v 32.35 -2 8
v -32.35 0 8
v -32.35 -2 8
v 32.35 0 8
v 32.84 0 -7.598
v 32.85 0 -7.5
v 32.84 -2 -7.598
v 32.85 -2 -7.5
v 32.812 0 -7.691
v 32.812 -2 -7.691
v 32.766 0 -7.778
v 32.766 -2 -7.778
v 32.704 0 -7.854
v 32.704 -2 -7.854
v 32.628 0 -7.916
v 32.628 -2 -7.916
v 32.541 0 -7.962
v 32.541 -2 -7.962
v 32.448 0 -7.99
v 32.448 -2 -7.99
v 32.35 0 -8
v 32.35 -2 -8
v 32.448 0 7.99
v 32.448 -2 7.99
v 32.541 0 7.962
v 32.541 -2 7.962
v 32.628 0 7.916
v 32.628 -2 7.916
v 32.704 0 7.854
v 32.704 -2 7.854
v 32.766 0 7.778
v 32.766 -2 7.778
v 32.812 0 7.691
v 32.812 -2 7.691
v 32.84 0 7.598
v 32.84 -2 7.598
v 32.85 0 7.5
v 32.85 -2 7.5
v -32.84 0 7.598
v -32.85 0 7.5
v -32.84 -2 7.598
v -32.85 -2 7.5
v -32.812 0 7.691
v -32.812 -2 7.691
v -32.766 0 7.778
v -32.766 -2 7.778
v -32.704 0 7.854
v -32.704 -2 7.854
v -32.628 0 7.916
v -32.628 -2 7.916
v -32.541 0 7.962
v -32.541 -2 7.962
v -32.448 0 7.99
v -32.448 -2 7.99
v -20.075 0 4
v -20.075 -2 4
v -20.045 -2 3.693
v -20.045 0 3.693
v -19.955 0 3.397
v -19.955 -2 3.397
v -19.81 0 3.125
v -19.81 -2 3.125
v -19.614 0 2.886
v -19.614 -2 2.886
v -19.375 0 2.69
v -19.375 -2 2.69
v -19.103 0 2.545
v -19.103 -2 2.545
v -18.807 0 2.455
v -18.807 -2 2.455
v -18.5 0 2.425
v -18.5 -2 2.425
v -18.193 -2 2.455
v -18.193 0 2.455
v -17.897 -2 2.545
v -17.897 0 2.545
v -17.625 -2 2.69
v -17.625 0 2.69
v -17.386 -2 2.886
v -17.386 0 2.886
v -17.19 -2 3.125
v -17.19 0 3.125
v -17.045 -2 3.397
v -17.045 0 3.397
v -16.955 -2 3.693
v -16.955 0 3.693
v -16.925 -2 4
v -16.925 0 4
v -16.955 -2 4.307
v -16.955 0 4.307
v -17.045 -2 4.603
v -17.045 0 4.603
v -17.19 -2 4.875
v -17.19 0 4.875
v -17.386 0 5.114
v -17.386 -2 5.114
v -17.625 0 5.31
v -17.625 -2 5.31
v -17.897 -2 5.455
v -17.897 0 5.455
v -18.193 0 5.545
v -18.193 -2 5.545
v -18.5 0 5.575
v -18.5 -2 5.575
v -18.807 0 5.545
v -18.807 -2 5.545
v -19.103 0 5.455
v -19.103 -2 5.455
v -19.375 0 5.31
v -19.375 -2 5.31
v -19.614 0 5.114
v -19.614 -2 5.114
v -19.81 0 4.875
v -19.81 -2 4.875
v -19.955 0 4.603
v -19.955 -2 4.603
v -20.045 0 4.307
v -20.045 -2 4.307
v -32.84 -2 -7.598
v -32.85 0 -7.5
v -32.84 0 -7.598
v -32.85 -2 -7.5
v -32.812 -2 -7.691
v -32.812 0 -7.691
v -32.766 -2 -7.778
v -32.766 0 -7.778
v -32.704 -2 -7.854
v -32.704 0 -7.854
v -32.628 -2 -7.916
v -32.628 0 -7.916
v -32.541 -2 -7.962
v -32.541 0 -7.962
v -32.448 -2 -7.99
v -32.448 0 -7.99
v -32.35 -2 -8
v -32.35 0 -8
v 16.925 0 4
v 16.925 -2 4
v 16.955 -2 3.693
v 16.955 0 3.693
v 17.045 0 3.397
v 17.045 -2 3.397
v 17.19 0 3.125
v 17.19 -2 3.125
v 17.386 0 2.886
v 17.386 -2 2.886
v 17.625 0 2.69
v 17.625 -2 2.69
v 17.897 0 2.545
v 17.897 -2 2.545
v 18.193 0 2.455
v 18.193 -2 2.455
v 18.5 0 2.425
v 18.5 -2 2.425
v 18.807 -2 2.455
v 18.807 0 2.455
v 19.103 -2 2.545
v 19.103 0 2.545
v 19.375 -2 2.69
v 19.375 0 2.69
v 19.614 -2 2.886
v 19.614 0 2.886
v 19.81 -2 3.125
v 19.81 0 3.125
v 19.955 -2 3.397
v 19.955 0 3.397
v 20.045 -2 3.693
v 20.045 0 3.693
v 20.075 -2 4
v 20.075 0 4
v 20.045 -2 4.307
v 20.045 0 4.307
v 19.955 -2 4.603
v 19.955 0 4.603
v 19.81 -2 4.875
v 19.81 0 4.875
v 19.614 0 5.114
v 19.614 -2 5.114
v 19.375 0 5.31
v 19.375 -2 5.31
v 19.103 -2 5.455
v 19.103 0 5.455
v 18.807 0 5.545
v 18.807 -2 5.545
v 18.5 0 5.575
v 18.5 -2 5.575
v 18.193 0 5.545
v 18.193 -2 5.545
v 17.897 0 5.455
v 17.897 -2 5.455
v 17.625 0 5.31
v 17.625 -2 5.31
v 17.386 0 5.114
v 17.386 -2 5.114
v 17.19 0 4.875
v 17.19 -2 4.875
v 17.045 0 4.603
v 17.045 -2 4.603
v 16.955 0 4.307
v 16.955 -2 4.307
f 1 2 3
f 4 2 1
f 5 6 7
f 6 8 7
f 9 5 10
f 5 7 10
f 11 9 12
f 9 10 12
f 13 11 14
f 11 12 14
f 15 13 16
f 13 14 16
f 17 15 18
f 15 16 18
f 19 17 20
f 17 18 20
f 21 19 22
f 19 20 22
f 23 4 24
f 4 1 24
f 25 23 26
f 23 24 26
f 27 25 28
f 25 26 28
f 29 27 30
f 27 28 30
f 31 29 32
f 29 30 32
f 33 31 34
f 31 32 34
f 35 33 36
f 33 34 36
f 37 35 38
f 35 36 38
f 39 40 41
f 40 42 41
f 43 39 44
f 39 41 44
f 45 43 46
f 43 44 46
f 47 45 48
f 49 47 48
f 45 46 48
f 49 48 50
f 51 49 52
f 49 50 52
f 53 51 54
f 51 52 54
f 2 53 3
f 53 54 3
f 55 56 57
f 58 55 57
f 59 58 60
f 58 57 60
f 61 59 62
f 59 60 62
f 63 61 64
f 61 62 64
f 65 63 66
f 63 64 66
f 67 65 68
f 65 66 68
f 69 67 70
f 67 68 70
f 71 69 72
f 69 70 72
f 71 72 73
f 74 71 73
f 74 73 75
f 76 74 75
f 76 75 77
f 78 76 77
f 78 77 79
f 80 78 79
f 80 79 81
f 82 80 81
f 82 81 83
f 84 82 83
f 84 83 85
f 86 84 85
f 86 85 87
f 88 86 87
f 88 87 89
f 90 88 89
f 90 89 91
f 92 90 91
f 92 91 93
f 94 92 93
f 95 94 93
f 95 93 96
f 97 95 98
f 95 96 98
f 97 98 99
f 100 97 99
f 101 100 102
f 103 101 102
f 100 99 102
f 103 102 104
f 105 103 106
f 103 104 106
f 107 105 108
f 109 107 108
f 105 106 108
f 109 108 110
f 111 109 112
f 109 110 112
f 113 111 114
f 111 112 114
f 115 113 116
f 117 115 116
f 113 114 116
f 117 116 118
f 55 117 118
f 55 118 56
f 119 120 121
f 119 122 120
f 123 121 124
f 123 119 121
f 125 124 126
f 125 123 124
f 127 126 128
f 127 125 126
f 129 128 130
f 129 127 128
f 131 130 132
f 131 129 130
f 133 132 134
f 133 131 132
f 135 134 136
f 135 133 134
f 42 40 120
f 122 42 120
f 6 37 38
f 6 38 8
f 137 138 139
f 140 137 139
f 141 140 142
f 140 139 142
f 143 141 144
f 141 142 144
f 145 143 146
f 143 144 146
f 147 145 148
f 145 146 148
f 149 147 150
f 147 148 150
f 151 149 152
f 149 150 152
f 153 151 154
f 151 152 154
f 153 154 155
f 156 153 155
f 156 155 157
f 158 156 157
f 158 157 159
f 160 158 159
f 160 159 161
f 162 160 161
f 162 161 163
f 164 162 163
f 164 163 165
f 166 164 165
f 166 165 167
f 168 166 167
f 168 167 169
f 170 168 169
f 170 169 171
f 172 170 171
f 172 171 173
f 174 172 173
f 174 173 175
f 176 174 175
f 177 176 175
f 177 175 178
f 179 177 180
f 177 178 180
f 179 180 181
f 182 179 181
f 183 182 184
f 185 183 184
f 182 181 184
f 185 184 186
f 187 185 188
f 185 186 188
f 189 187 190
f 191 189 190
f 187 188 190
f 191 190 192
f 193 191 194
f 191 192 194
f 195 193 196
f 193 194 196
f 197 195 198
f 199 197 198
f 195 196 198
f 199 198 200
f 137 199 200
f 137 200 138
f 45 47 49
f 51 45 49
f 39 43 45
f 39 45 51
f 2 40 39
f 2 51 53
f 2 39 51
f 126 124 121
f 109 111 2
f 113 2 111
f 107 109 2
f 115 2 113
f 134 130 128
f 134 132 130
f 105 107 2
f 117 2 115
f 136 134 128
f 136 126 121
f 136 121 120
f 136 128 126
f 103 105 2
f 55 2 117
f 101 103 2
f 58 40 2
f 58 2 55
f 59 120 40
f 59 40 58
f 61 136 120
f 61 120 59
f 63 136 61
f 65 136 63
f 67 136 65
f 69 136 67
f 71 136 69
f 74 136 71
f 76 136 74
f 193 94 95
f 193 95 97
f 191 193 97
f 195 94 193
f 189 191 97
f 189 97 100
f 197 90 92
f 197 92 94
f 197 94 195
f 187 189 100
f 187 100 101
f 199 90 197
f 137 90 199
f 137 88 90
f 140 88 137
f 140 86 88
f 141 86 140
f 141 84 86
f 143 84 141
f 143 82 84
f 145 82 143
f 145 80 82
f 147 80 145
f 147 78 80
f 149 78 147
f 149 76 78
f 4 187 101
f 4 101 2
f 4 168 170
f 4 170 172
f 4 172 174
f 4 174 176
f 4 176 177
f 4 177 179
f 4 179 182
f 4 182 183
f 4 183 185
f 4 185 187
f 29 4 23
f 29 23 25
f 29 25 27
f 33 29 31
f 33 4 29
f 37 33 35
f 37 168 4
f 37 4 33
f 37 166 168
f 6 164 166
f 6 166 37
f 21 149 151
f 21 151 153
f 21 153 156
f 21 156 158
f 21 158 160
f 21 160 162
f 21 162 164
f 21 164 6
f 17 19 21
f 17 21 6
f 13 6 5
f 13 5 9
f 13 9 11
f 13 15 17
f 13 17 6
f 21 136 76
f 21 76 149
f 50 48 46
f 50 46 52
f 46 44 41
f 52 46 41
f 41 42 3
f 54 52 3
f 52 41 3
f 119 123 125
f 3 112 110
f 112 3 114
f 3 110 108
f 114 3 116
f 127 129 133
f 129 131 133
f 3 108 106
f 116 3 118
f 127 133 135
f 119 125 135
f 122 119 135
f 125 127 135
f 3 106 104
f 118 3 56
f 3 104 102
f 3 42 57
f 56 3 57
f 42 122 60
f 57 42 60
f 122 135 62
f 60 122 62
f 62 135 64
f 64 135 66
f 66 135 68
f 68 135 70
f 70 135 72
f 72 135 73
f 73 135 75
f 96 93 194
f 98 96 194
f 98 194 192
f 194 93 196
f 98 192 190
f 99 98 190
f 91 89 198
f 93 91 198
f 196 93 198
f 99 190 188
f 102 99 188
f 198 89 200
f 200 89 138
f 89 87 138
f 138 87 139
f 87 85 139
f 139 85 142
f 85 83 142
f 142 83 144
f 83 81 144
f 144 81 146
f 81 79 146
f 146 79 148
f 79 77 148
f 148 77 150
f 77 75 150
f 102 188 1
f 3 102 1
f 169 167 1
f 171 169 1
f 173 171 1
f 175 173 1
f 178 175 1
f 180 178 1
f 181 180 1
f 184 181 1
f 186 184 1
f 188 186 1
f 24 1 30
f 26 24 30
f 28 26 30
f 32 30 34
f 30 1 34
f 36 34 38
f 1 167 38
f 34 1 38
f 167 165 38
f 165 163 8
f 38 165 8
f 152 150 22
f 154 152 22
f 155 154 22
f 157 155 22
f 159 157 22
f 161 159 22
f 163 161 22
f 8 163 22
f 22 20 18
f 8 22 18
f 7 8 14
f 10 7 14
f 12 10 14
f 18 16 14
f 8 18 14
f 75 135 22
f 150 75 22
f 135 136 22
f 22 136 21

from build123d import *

# Parameters (mm, degrees)
SKETCH_1_W        = 65.7
SKETCH_1_H        = 16
EXTRUDE_1_DEPTH   = 2
FILLET_1_R        = 0.5
HOLE_WIZARD_M31_D = 3.15


with BuildPart() as part:
    # Эскиз1 → Бобышка-Вытянуть1 (new body)
    with BuildSketch(Plane(origin=(0, 0, 0), x_dir=(1, 0, 0), z_dir=(0, 1, 0))):
        Rectangle(SKETCH_1_W, SKETCH_1_H)
    extrude(amount=-EXTRUDE_1_DEPTH)

    # Скругление1
    fillet_1_edges = [part.edges().sort_by_distance(p)[0] for p in [
        (32.85, -1, 8),
        (-32.85, -1, 8),
        (-32.85, -1, -8),
        (32.85, -1, -8),
    ]]
    fillet(fillet_1_edges, radius=FILLET_1_R)

    # Сверло под метчик  спиральное M31 (through all)
    with Locations(Plane(origin=(0, 0, 0), x_dir=(1, 0, 0), z_dir=(0, 1, 0))):
        with Locations((18.5, -4), (-18.5, -4)):
            Hole(HOLE_WIZARD_M31_D / 2)


solid = part.part
